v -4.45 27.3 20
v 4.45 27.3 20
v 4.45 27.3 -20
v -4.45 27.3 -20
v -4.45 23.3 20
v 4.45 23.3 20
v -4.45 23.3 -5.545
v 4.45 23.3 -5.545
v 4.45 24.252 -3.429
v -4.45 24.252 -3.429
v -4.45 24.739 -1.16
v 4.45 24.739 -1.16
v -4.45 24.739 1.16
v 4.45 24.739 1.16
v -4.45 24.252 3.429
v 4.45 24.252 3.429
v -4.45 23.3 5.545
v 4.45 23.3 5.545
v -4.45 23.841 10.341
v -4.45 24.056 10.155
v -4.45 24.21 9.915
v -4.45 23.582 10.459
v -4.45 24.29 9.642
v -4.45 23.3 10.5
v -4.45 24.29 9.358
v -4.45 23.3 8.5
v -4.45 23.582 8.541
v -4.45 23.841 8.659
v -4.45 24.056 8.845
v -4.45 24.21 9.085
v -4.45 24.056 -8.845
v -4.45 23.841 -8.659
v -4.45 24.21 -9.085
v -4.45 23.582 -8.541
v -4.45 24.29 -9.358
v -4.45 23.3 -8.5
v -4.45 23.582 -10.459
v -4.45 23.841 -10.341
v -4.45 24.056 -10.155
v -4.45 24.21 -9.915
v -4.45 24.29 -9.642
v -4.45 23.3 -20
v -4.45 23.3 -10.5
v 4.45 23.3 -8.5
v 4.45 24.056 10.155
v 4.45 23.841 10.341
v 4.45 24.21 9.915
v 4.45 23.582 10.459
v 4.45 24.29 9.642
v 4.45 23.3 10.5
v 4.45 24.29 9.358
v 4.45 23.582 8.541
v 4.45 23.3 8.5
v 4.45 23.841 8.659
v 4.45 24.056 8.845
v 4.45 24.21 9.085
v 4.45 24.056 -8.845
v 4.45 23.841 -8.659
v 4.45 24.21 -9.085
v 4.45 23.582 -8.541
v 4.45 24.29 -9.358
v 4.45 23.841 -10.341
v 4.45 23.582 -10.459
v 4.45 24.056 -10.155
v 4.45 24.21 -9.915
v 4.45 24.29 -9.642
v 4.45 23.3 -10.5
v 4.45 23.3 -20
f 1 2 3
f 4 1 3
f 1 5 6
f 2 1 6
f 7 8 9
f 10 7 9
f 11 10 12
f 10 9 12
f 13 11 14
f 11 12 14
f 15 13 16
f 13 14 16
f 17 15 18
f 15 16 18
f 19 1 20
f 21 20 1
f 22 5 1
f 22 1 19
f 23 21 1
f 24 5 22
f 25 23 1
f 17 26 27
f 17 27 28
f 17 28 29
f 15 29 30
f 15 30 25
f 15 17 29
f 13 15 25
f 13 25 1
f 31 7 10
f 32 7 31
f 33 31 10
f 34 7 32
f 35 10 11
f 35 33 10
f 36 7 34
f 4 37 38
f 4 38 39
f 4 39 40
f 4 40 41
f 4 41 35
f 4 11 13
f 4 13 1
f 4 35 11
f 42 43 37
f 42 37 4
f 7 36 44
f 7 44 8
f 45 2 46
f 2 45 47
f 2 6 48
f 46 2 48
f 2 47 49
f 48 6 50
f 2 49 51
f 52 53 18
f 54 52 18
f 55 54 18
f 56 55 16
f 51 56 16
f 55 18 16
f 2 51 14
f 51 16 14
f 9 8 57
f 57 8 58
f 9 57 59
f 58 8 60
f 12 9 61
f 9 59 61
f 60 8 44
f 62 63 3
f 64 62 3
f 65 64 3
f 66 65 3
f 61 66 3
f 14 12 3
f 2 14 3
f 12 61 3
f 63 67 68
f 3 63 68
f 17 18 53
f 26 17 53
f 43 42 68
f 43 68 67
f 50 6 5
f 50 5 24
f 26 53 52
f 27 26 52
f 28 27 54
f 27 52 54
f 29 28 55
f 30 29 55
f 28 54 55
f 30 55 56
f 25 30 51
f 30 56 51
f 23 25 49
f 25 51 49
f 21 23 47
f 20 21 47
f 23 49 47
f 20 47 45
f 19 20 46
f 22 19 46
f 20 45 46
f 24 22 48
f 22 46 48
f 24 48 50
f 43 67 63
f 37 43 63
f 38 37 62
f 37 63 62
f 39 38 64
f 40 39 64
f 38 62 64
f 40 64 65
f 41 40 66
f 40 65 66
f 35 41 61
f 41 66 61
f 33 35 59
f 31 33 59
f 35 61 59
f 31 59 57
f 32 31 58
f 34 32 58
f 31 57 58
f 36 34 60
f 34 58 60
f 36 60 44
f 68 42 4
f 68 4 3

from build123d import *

# Parameters (mm, degrees)
SKETCH1_W           = 8.9
SKETCH1_H           = 40
BOSS_EXTRUDE1_DEPTH = 29.39
SKETCH5_W           = 27.9
SKETCH5_H           = 23.3
CUT_EXTRUDE2_DEPTH  = 37.646720181
SKETCH7_R           = 1
SKETCH7_R_2         = 11
CUT_EXTRUDE3_DEPTH  = 37.646720181
SKETCH8_W           = 40
SKETCH8_H           = 23.3
CUT_EXTRUDE4_DEPTH  = 37.646720181
SKETCH9_W           = 40
SKETCH9_H           = 2.09
CUT_EXTRUDE5_DEPTH  = 37.646720181


with BuildPart() as part:
    # Sketch1 → Boss-Extrude1 (new body)
    with BuildSketch(Plane(origin=(0, 0, 0), x_dir=(1, 0, 0), z_dir=(0, 1, 0))):
        Rectangle(SKETCH1_W, SKETCH1_H)
    extrude(amount=BOSS_EXTRUDE1_DEPTH)

    # Sketch5 → Cut-Extrude2 (cut, through all)
    with BuildSketch(Plane.ZY.offset(4.45)):
        with Locations((0, 11.65)):
            Rectangle(SKETCH5_W, SKETCH5_H)
    extrude(amount=-CUT_EXTRUDE2_DEPTH, mode=Mode.SUBTRACT)

    # Sketch7 → Cut-Extrude3 (cut, through all)
    with BuildSketch(Plane(origin=(4.45, 0, 0), x_dir=(0, 0, -1), z_dir=(1, 0, 0))):
        with Locations((9.5, 23.3)):
            Circle(SKETCH7_R)
        with Locations((-9.5, 23.3)):
            Circle(SKETCH7_R)
        with Locations((0, 13.8)):
            Circle(SKETCH7_R_2)
    extrude(amount=-CUT_EXTRUDE3_DEPTH, mode=Mode.SUBTRACT)

    # Sketch8 → Cut-Extrude4 (cut, through all)
    with BuildSketch(Plane(origin=(4.45, 0, 0), x_dir=(0, 0, -1), z_dir=(1, 0, 0))):
        with Locations((0, 11.65)):
            Rectangle(SKETCH8_W, SKETCH8_H)
    extrude(amount=-CUT_EXTRUDE4_DEPTH, mode=Mode.SUBTRACT)

    # Sketch9 → Cut-Extrude5 (cut, through all)
    with BuildSketch(Plane(origin=(4.45, 0, 0), x_dir=(0, 0, -1), z_dir=(1, 0, 0))):
        with Locations((0, 28.345)):
            Rectangle(SKETCH9_W, SKETCH9_H)
    extrude(amount=-CUT_EXTRUDE5_DEPTH, mode=Mode.SUBTRACT)


solid = part.part
